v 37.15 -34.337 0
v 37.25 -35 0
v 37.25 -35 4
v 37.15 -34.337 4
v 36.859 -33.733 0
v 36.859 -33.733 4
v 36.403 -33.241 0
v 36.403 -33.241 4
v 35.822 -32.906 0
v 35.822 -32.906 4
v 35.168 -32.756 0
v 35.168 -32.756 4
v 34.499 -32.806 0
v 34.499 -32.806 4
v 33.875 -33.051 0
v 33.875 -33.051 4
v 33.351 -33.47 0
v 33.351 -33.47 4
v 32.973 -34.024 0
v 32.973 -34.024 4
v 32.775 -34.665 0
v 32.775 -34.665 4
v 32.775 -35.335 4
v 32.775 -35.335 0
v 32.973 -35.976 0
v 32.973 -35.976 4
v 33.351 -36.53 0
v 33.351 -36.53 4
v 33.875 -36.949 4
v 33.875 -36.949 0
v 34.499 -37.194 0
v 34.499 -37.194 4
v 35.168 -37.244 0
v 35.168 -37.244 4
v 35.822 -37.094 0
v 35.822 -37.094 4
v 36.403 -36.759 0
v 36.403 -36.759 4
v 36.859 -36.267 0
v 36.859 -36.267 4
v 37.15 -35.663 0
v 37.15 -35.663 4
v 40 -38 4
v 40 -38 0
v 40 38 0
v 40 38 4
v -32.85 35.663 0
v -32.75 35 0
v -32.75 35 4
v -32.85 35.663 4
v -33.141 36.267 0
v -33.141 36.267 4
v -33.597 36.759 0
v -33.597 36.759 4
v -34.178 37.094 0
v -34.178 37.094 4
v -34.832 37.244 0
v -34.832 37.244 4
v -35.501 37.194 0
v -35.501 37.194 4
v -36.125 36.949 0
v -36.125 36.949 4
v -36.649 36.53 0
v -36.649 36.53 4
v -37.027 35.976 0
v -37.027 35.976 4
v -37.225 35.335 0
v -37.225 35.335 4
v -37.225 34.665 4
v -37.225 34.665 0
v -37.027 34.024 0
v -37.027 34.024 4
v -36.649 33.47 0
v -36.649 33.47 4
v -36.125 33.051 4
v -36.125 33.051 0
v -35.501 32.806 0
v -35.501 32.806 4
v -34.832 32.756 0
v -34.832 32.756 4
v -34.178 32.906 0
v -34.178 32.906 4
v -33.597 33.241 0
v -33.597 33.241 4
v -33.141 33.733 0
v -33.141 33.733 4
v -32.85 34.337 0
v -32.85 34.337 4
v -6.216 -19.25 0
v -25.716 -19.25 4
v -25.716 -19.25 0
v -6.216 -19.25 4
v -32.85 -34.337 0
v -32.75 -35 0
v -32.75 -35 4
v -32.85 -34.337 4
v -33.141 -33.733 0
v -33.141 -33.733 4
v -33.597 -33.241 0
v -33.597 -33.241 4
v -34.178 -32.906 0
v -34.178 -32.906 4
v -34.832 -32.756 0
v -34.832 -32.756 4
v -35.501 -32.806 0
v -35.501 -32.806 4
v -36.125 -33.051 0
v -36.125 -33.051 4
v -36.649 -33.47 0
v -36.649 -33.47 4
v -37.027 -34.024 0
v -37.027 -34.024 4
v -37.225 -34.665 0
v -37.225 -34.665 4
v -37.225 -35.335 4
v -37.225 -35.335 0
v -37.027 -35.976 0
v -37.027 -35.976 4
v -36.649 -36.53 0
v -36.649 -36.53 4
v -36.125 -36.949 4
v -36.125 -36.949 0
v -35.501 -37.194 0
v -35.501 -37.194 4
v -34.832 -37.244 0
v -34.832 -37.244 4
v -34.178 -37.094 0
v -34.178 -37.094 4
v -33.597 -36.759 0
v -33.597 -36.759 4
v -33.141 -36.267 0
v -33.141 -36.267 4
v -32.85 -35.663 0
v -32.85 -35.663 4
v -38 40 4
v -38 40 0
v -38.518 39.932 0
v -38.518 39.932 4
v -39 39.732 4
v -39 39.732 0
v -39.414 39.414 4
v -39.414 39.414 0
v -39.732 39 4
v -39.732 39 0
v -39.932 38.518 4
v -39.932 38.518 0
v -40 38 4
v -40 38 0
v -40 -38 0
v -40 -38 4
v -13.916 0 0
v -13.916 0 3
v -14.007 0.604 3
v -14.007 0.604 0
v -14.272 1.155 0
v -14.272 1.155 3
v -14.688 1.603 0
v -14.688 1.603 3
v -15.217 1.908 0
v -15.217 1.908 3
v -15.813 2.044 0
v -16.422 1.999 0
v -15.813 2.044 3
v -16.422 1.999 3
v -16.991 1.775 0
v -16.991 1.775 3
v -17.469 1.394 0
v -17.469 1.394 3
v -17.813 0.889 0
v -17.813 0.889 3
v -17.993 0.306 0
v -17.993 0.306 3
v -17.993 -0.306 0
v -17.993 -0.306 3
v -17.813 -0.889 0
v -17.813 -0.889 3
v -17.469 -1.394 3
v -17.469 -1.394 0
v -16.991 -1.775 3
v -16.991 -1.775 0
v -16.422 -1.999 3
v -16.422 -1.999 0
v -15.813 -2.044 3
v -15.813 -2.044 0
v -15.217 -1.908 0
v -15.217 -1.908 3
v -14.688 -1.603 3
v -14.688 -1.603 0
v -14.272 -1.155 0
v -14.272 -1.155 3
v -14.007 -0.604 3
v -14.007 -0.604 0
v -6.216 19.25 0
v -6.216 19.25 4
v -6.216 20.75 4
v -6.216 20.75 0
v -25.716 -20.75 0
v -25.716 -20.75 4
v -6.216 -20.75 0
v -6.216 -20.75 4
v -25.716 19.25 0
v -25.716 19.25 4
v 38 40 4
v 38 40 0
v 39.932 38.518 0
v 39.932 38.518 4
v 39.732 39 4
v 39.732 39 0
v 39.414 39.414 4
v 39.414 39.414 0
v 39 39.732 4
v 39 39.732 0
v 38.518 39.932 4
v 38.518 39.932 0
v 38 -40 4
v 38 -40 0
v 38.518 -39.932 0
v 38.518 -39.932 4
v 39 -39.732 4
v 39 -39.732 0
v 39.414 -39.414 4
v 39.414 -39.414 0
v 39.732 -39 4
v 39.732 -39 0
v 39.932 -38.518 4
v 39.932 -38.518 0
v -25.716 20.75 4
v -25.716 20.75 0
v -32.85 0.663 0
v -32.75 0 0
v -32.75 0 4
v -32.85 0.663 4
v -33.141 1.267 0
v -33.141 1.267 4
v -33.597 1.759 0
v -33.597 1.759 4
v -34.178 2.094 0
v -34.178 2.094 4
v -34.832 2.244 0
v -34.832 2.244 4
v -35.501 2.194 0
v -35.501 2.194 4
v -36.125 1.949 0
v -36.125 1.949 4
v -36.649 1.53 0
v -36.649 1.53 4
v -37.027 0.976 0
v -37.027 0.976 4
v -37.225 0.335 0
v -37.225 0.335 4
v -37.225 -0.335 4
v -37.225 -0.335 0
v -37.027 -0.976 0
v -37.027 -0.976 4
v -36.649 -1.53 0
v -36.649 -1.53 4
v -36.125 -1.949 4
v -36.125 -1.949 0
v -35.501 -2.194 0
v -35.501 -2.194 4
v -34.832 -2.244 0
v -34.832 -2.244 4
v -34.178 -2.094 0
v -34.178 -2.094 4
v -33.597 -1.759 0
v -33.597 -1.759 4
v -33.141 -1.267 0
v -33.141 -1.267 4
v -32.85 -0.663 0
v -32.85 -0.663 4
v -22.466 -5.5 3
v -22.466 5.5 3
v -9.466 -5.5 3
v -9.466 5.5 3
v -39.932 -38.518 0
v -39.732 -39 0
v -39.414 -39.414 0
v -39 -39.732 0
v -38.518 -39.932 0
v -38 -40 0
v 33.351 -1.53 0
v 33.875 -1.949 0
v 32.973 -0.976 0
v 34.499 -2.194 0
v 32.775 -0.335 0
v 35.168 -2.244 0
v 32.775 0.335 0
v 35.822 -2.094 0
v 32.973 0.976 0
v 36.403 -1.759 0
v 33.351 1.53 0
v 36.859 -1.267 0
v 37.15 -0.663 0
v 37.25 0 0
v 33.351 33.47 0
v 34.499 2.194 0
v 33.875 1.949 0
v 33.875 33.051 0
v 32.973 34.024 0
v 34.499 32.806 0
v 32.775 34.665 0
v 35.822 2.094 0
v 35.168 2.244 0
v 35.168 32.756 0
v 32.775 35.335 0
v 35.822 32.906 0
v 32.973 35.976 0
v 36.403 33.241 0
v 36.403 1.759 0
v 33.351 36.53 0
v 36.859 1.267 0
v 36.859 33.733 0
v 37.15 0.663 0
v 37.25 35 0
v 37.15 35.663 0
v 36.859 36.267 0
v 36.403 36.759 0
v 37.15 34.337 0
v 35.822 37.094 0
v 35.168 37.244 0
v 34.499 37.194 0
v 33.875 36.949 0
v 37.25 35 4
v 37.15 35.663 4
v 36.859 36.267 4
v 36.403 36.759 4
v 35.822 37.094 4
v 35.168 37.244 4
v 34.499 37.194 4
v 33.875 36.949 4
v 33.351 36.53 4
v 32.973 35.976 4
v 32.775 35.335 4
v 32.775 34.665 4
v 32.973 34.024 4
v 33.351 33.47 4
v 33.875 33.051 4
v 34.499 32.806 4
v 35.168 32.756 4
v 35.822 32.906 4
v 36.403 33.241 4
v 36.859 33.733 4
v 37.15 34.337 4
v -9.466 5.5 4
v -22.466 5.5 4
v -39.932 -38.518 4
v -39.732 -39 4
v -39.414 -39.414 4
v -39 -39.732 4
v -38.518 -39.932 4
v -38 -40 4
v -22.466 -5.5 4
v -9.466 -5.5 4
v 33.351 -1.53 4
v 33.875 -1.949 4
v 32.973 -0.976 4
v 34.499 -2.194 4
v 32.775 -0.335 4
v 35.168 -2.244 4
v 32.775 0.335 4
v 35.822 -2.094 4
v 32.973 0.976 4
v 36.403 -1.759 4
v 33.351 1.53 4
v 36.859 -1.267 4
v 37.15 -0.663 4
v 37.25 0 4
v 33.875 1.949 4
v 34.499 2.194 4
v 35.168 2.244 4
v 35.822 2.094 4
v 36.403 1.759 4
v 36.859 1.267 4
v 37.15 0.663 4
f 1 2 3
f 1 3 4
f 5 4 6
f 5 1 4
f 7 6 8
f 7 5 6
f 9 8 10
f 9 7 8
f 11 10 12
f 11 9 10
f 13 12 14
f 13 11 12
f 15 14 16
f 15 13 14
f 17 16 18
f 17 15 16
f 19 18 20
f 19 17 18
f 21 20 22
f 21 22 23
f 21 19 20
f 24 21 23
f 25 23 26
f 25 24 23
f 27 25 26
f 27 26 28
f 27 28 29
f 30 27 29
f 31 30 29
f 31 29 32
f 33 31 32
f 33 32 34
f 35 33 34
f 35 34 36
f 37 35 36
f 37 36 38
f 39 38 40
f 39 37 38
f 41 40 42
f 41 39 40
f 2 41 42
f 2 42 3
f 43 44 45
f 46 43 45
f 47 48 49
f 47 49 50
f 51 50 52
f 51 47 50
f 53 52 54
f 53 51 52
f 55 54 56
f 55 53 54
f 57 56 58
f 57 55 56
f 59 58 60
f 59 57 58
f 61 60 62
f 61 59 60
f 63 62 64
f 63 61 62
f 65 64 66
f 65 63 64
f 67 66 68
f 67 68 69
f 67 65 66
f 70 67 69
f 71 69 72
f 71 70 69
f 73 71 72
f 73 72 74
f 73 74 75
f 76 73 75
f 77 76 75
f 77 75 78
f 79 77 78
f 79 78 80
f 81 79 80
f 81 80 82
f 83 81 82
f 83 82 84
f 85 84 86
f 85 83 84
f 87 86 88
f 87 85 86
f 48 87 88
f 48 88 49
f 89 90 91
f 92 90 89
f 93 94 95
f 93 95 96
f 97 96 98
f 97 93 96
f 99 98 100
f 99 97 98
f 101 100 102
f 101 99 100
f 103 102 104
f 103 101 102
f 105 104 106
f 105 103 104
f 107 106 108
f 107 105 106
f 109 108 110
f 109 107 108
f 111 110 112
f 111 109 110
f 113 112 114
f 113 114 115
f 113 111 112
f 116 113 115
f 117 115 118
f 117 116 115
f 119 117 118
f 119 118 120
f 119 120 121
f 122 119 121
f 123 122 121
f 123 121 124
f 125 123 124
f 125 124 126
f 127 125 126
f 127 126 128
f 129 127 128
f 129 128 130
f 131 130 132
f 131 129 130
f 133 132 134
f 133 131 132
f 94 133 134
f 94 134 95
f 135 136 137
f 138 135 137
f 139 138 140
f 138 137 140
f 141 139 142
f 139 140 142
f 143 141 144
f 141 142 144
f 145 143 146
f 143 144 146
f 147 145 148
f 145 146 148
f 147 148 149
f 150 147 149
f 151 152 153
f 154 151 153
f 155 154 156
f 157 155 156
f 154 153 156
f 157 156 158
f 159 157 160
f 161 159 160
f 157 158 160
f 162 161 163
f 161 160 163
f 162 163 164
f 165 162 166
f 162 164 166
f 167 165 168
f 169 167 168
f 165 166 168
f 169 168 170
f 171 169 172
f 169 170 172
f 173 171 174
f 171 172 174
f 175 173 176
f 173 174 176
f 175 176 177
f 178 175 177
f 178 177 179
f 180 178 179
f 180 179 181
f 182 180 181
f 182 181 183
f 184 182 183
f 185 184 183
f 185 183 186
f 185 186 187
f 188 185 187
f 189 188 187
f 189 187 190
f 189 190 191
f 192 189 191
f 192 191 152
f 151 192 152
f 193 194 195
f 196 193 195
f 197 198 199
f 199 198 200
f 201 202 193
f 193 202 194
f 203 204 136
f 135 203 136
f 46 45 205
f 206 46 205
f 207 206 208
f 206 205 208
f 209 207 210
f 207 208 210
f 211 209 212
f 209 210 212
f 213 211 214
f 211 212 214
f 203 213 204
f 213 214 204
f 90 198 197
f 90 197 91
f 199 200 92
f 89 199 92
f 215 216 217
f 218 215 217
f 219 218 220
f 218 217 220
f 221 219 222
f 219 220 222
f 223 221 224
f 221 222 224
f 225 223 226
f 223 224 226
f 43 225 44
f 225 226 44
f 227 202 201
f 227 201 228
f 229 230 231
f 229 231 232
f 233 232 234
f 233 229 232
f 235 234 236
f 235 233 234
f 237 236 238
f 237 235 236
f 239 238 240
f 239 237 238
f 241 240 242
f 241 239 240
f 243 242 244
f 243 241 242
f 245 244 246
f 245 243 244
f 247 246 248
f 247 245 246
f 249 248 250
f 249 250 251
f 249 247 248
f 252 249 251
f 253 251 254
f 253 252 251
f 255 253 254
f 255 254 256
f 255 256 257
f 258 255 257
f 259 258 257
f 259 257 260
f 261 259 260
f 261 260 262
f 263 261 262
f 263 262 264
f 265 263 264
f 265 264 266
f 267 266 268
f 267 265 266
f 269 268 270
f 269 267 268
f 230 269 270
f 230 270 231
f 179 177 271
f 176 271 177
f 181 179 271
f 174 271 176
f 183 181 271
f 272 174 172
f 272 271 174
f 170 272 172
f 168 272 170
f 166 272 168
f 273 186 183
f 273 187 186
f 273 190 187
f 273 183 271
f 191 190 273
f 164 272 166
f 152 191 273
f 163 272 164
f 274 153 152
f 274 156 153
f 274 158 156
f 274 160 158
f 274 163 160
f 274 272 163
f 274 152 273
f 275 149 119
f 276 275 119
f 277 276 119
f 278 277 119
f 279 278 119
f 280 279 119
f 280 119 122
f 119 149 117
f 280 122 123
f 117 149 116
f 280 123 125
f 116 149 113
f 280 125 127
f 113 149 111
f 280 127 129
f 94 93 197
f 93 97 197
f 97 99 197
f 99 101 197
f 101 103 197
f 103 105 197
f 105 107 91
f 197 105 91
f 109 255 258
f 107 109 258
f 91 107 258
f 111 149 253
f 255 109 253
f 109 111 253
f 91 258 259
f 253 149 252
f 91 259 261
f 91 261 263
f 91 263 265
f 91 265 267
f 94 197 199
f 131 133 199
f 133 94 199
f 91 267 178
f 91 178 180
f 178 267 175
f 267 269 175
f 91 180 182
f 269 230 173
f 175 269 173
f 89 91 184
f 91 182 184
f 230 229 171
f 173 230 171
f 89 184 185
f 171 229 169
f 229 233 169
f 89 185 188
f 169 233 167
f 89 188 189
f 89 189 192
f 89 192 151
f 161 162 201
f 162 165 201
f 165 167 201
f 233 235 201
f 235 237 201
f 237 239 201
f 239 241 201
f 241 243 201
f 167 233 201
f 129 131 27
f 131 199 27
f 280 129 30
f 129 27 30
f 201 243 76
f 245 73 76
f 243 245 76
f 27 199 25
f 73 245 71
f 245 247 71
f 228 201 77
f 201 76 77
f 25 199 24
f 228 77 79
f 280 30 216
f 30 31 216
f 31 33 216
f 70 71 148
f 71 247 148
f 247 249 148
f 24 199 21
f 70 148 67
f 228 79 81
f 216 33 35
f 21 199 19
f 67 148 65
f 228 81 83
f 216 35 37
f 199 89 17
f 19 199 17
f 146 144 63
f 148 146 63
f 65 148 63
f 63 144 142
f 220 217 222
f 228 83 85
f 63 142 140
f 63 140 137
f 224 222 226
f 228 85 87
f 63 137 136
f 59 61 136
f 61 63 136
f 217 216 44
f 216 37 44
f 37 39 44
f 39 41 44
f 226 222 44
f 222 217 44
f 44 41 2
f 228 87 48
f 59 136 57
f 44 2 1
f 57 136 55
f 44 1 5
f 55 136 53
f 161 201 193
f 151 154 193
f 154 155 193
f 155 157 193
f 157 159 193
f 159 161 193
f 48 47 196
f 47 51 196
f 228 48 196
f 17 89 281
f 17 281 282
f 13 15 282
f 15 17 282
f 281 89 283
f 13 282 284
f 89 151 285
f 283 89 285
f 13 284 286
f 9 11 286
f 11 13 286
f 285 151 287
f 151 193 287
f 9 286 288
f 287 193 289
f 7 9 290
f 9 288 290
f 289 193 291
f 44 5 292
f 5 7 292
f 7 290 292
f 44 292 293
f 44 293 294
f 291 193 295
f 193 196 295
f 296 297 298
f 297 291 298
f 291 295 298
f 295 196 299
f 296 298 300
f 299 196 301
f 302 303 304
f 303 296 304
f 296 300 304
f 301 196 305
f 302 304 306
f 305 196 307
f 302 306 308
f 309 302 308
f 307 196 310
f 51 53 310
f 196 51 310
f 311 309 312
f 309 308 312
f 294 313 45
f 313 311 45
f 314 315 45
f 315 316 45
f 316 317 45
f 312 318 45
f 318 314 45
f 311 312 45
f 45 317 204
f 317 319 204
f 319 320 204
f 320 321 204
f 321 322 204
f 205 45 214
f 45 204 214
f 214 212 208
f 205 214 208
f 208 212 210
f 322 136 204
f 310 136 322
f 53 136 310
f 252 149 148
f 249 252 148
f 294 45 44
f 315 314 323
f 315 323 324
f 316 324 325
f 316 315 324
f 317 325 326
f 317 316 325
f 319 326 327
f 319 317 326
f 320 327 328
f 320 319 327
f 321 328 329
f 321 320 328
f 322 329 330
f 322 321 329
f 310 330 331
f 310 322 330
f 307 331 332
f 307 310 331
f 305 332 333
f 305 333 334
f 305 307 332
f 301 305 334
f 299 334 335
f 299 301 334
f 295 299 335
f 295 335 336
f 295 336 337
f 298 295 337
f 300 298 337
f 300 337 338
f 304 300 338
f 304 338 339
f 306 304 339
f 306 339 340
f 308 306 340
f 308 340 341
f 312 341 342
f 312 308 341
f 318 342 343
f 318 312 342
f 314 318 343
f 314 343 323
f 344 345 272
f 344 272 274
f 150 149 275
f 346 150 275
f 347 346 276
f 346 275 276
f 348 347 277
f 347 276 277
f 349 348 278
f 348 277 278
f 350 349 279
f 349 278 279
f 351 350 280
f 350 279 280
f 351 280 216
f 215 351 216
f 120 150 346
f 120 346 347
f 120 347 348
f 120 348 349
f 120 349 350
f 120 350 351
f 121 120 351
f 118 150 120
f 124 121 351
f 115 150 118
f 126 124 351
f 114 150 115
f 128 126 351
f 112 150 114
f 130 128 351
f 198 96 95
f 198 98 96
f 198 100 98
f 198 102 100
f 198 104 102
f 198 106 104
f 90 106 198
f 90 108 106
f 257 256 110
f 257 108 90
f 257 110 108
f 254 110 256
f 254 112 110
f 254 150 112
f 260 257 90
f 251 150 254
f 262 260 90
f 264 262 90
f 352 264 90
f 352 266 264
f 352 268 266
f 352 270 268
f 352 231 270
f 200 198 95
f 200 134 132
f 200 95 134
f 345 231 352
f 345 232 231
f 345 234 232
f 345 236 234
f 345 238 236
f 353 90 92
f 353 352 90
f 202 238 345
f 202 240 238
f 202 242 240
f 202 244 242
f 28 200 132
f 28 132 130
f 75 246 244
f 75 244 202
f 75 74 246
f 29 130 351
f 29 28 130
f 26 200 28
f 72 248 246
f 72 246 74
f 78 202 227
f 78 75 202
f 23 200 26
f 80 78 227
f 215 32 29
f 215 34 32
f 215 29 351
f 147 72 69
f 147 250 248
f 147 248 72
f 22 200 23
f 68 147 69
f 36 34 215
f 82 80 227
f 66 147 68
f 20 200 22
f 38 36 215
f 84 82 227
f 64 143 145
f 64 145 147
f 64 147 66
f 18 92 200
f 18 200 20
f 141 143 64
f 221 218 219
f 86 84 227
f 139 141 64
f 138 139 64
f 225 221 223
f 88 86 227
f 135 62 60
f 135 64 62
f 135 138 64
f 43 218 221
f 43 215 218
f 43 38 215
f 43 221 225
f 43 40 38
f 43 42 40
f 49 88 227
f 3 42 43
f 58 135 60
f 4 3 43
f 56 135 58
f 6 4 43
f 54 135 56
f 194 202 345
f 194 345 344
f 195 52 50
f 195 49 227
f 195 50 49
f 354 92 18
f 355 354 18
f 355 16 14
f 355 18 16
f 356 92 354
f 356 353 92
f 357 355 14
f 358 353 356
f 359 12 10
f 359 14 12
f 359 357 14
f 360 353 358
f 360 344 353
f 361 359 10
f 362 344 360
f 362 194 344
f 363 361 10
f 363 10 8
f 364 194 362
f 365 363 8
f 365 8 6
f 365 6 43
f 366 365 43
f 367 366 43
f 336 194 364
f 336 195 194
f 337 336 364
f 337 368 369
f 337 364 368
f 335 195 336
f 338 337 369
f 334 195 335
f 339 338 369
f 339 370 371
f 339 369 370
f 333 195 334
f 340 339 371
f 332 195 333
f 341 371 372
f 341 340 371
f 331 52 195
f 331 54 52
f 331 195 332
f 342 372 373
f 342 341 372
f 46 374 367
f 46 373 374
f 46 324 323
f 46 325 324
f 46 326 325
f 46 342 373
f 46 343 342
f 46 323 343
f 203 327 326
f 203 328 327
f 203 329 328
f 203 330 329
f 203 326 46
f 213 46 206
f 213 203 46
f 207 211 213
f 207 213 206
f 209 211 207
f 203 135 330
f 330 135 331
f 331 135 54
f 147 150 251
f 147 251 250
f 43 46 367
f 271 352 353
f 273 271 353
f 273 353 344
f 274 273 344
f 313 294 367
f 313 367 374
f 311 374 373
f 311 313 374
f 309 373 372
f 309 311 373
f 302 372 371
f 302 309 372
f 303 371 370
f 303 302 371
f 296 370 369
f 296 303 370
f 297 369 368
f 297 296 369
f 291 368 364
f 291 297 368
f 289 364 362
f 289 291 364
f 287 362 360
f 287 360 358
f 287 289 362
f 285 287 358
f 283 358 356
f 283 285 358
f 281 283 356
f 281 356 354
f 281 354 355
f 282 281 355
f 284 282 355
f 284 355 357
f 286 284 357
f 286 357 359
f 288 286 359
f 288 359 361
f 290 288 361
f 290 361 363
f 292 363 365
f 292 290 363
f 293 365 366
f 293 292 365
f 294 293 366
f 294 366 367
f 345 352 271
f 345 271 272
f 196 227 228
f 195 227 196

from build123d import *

# Parameters (mm, degrees)
F0_R     = 2.25
F1_DEPTH = 4
F2_R     = 2.05
F3_DEPTH = 5
F4_W     = 13
F4_H     = 11
F5_DEPTH = 1
F6_W     = 19.5
F6_H     = 1.5
F7_DEPTH = 25


# Not quite as in the source:
# - a feature names something its author has since deleted; it is built from what else it names


with BuildPart() as f1:
    # F0 (on Top) → F1 (new body)
    with BuildSketch(Plane.XY):
        with BuildLine():
            ThreePointArc((40, 38), (39.4142135624, 39.4142135624), (38, 40))
            Line((38, 40), (-38, 40))
            ThreePointArc((-38, 40), (-39.4142135624, 39.4142135624), (-40, 38))
            Line((-40, 38), (-40, -38))
            ThreePointArc((-40, -38), (-39.4142135624, -39.4142135624), (-38, -40))
            Line((-38, -40), (38, -40))
            ThreePointArc((38, -40), (39.4142135624, -39.4142135624), (40, -38))
            Line((40, -38), (40, 38))
        make_face()
        with Locations((-35, -35)):
            Circle(F0_R, mode=Mode.SUBTRACT)
        with Locations((35, -35)):
            Circle(F0_R, mode=Mode.SUBTRACT)
        with Locations((-35, 0)):
            Circle(F0_R, mode=Mode.SUBTRACT)
        with Locations((-35, 35)):
            Circle(F0_R, mode=Mode.SUBTRACT)
        with Locations((35, 0)):
            Circle(F0_R, mode=Mode.SUBTRACT)
        with Locations((35, 35)):
            Circle(F0_R, mode=Mode.SUBTRACT)
    extrude(amount=F1_DEPTH)

    # F2 (on face) → F3 (cut)
    with BuildSketch(Plane.XY.offset(4)):
        with Locations((-15.9661, 0)):
            Circle(F2_R)
    extrude(amount=-F3_DEPTH, mode=Mode.SUBTRACT)

    # F4 (on face) → F5 (cut)
    with BuildSketch(Plane.XY.offset(4)):
        with Locations((-15.9661, 0)):
            Rectangle(F4_W, F4_H)
    extrude(amount=-F5_DEPTH, mode=Mode.SUBTRACT)

    # F6 (on face) → F7 (cut)
    with BuildSketch(Plane.XY.offset(4)):
        with Locations((-15.9661, 20)):
            Rectangle(F6_W, F6_H)
        with Locations((-15.9661, -20)):
            Rectangle(F6_W, F6_H)
    extrude(amount=-F7_DEPTH, mode=Mode.SUBTRACT)


solid = f1.part
